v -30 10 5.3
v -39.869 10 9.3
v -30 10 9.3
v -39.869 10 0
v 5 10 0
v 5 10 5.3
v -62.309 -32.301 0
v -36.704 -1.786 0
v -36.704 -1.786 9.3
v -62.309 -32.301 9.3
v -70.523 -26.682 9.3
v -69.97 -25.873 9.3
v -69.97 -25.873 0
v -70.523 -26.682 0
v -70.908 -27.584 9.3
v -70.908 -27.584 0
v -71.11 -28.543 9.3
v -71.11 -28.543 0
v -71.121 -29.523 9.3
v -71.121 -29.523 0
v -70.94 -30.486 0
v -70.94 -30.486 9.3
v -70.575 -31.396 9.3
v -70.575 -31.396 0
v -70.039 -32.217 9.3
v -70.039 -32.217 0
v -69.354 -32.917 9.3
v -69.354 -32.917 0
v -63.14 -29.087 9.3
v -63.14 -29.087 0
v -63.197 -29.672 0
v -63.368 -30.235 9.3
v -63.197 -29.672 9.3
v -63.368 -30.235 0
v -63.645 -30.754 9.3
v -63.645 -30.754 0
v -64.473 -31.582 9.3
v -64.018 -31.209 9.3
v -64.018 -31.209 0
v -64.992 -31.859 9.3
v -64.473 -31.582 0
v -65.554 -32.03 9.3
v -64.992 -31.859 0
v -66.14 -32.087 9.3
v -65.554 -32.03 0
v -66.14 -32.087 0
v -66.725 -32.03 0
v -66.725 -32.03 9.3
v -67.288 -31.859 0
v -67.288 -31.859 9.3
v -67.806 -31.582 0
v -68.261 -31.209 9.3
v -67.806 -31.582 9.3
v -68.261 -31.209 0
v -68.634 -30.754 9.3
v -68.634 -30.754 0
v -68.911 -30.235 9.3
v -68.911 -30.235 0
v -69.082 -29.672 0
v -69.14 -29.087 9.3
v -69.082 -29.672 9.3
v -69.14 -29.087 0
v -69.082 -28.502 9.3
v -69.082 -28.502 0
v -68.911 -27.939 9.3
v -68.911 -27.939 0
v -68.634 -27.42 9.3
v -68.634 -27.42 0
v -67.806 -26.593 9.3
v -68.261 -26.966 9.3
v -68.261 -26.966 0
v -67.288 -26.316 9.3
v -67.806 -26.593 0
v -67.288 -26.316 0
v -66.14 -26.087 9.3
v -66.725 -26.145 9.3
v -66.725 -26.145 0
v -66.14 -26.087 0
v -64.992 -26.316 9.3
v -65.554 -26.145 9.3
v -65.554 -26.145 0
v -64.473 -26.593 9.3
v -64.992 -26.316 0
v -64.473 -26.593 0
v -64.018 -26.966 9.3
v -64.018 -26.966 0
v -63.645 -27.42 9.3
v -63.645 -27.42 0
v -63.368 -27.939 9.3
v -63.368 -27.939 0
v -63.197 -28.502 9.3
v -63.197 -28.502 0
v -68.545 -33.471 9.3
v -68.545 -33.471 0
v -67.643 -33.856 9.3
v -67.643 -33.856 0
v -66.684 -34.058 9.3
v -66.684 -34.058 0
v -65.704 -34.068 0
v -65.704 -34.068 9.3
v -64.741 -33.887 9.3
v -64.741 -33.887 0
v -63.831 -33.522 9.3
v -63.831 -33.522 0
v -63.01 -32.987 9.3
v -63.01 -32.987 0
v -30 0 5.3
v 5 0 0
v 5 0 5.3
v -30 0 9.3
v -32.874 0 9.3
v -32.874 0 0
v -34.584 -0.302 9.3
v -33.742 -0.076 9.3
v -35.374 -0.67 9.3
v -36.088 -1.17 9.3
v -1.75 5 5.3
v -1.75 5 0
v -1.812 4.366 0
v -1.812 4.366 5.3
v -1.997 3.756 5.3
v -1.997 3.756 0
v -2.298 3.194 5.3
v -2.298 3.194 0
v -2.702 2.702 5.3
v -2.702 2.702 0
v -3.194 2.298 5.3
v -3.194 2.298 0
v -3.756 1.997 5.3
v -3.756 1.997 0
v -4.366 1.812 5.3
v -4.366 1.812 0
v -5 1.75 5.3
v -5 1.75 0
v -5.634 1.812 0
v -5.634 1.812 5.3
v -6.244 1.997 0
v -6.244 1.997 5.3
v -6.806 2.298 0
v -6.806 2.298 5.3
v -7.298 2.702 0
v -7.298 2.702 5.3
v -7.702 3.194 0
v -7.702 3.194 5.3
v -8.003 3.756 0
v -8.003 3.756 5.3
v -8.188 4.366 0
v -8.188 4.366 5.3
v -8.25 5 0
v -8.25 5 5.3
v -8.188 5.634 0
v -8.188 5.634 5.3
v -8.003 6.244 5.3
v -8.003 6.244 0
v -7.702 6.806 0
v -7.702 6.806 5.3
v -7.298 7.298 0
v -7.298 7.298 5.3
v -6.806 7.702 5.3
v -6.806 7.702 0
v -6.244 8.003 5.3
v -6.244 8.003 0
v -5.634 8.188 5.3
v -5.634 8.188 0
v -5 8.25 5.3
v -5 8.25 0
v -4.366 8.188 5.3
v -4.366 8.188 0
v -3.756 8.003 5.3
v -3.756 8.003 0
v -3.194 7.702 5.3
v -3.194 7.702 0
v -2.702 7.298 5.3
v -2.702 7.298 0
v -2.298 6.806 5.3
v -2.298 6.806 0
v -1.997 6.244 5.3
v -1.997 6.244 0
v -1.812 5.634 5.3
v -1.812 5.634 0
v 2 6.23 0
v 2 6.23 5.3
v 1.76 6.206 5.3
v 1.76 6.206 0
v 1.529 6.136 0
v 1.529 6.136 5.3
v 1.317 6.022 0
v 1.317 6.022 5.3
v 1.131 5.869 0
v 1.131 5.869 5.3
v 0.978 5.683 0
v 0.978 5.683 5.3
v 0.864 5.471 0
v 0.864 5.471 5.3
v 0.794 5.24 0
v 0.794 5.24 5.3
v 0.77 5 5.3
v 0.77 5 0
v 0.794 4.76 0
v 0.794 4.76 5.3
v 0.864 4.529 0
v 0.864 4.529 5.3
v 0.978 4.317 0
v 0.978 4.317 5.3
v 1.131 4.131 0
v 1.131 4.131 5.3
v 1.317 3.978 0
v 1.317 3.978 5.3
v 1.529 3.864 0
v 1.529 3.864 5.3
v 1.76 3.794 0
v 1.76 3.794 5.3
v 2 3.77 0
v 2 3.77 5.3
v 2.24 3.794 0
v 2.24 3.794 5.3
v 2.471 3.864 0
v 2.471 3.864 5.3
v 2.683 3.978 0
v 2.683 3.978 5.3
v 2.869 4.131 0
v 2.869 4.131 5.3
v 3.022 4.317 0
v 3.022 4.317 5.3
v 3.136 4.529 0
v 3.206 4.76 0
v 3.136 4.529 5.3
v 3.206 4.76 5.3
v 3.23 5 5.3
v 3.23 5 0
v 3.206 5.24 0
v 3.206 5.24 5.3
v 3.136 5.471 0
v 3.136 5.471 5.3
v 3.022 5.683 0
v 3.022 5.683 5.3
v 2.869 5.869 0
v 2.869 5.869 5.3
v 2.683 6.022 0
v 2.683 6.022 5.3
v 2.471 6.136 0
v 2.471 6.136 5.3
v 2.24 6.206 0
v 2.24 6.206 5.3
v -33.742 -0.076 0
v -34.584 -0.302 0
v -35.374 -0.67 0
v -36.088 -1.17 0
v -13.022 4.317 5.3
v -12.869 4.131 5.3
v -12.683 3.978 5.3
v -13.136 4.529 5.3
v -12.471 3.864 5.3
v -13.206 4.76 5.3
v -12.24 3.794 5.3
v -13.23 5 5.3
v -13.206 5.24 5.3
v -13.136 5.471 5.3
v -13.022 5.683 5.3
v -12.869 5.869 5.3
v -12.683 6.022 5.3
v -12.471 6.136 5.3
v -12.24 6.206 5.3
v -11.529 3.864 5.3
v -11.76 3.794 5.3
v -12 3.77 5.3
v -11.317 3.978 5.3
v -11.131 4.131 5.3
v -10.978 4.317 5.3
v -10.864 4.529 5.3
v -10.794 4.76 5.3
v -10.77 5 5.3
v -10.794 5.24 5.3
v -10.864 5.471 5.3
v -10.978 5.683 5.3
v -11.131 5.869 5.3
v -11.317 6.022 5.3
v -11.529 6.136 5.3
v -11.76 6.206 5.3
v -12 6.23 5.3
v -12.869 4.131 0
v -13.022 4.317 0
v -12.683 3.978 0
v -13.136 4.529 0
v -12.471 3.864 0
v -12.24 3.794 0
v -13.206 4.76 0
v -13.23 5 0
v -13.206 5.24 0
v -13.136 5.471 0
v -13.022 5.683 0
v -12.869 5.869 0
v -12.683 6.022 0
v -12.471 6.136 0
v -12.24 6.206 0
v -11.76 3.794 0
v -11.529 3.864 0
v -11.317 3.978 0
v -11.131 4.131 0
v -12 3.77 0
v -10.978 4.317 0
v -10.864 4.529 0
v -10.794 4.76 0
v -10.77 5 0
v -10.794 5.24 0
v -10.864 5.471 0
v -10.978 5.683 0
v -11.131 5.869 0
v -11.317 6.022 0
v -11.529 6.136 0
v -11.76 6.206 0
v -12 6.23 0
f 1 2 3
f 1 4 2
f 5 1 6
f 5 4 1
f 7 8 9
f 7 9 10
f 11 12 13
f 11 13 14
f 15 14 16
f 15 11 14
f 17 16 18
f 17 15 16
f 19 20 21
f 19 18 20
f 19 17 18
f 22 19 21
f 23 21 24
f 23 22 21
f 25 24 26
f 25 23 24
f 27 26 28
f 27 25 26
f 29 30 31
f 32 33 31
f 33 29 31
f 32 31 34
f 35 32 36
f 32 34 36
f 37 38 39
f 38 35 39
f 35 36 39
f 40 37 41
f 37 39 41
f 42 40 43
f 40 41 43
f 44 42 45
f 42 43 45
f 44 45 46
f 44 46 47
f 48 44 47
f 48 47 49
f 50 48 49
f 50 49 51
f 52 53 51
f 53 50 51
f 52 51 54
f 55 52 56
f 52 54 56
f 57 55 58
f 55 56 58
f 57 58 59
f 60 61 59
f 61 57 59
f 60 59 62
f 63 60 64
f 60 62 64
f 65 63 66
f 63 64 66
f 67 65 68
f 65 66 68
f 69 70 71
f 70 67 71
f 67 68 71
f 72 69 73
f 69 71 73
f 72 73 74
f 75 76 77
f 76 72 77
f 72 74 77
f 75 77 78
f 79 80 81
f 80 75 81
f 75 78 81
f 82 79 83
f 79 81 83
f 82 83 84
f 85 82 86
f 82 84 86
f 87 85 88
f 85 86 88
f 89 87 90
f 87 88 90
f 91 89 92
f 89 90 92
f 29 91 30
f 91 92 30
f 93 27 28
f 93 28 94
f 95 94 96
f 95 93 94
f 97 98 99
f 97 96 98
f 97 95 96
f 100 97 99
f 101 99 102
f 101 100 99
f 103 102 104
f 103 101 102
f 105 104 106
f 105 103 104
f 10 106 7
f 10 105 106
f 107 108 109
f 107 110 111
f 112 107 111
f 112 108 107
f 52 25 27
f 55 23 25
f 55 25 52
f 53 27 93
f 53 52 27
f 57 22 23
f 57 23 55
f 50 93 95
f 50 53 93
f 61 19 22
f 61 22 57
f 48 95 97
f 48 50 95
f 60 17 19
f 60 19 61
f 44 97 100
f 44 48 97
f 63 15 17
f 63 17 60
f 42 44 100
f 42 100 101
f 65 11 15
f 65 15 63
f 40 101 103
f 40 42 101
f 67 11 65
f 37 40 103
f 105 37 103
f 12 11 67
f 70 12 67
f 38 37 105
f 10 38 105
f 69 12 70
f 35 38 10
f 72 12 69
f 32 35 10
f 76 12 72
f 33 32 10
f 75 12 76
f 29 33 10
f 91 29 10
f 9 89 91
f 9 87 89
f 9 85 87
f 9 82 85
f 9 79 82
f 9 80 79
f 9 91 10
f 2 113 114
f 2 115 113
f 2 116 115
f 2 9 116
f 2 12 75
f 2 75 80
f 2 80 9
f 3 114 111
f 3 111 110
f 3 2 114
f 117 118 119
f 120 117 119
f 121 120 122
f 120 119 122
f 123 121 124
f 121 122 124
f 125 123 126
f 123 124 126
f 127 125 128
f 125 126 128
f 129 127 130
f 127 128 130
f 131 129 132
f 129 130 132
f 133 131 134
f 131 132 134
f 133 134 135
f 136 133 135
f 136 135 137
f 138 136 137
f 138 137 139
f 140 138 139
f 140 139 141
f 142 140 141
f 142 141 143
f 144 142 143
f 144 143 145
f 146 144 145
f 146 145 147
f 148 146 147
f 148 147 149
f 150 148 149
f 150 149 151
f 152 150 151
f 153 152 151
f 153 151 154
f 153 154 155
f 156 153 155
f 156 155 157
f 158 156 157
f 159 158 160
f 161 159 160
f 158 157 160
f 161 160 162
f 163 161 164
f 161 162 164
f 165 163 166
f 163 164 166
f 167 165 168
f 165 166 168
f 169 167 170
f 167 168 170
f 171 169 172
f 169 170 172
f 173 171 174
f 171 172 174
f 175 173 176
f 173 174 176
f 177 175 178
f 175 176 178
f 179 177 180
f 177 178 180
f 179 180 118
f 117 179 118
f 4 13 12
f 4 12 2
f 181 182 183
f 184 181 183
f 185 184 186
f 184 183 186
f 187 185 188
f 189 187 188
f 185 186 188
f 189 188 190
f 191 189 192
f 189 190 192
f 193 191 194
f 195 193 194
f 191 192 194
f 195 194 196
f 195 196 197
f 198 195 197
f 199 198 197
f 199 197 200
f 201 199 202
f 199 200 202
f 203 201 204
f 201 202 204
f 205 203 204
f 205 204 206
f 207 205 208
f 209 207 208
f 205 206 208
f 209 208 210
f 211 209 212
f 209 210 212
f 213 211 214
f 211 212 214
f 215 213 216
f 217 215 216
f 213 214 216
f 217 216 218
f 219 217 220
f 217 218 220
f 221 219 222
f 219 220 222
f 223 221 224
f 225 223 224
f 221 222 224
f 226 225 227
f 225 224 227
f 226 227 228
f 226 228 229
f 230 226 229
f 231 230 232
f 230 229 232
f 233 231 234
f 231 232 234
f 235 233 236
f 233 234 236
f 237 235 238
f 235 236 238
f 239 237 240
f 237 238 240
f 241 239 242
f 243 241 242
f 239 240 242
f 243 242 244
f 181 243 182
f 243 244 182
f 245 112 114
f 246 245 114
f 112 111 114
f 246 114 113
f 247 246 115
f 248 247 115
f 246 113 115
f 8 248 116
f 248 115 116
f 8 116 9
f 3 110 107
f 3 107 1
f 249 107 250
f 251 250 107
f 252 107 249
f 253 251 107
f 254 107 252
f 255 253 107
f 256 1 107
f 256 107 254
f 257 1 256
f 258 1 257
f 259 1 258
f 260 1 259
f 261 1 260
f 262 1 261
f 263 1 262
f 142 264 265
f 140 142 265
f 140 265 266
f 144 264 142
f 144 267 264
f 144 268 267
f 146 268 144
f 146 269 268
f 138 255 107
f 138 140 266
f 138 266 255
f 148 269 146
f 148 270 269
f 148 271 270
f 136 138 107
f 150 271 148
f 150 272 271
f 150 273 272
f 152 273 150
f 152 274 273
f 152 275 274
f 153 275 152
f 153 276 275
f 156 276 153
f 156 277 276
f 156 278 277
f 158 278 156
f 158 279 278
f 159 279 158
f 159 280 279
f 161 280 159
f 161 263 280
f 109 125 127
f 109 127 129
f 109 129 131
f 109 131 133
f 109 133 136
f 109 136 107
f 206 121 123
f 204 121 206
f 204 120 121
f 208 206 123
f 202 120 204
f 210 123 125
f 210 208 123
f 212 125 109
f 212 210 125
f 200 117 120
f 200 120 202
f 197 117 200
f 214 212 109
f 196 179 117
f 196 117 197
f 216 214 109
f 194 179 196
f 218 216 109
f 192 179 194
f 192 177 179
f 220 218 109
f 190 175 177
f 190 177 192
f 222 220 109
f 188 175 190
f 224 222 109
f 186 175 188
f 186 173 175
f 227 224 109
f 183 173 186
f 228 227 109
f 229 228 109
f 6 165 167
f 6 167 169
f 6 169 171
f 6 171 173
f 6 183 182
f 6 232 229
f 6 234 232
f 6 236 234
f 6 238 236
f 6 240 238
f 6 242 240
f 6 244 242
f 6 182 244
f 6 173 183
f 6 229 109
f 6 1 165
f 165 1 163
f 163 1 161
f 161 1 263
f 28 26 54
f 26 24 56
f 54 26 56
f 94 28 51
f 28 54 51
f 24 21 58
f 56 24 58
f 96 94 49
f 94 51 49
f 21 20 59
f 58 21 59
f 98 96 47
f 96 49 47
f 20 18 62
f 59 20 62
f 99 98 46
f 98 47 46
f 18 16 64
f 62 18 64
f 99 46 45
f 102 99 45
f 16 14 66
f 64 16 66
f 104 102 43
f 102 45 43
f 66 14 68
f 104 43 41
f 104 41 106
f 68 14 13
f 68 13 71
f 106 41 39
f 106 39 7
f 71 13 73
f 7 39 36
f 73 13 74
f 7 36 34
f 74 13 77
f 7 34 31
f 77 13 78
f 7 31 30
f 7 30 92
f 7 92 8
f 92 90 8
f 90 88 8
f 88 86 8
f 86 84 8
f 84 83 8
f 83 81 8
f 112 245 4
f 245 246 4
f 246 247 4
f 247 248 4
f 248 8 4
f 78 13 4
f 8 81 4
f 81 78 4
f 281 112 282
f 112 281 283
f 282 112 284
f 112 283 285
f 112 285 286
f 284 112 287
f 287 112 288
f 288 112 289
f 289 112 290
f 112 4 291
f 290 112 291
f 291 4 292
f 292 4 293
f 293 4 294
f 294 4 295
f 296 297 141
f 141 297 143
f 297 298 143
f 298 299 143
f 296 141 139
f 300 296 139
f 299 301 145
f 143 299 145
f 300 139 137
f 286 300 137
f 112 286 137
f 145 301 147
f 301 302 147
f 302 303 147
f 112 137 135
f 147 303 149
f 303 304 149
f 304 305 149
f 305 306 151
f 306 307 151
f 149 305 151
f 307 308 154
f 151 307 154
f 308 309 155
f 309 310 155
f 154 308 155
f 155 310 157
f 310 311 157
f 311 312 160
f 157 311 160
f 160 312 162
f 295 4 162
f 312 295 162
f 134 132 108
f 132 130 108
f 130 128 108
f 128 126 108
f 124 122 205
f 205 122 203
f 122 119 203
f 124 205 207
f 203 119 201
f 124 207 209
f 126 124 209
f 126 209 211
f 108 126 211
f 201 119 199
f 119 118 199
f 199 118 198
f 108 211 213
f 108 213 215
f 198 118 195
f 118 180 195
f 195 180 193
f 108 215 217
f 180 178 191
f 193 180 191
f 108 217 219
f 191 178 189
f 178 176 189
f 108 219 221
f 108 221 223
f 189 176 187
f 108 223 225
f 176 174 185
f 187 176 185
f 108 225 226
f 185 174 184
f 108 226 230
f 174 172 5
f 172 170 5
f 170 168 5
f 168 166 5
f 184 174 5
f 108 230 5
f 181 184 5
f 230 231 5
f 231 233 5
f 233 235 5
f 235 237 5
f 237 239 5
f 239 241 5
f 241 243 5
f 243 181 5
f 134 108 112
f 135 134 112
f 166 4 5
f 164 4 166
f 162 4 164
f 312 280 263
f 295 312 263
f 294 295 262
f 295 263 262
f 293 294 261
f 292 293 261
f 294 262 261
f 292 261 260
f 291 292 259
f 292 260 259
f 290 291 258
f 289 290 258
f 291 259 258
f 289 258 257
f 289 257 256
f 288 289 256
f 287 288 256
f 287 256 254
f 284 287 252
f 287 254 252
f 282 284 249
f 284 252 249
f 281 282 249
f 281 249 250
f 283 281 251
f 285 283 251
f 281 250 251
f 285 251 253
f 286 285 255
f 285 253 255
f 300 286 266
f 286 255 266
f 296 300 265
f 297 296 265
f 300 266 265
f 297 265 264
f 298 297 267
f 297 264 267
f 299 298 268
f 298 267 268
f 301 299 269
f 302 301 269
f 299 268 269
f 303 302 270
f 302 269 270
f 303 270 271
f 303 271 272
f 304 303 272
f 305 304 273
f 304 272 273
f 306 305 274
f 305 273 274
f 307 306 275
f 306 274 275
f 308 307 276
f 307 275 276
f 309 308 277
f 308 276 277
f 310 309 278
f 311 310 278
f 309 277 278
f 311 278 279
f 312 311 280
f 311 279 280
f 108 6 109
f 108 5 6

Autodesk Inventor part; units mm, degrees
ref_plane "YZ Plane" through (0, 0, 0) normal (1, 0, 0) x (0, 1, 0)
ref_plane "XZ Plane" through (0, 0, 0) normal (0, 1, 0) x (-1, 0, 0)
ref_plane "XY Plane" through (0, 0, 0) normal (0, 0, 1) x (1, 0, 0)
sketch "Sketch1" plane through (0, 0, 0) normal (0, 0, 1) x (1, 0, 0)
  line L0 (0, 0) -> (-35.2056, 0)
  line L1 (-35.2056, 0) -> (-65.5234, -36.1314)
  line L2 (-65.5234, -36.1314) -> (-73.1839, -29.7035)
  line L3 (-73.1839, -29.7035) -> (-39.8687, 10)
  line L4 (-39.8687, 10) -> (0, 10)
  line L5 (0, 10) -> (0, 0)
  circle A0 centre (-66.1397, -29.0872) radius 3
  circle A1 centre (-5, 5) radius 3.25
  line L6 (0, 5) -> (-37.5371, 5) construction
  line L7 (-37.5371, 5) -> (-69.3536, -32.9174) construction
  line L8 (0, 0) -> (-65.5234, -36.1314) construction
  line L9 (0, 10) -> (5, 10)
  line L10 (5, 10) -> (5, 0)
  line L11 (5, 0) -> (0, 0)
  line L12 (0, 0) -> (0, 10)
  dimension "d0" = 10
  dimension "d1" = 6
  dimension "d2" = 6.5
  dimension "d3" = 5
  dimension "d4" = 5
  dimension "d5" = 70
  dimension "d26" = 50
  dimension "d28" = 17
  dimension "d37" = 5
extrude "Extrusion1" add sketch "Sketch1" along normal blind 9.3
fillet "Fillet1" radius 5 3 edges at (-73.1839, -29.7035, 4.65) (-65.5234, -36.1314, 4.65) (-35.2056, 0, 4.65)
sketch "Sketch5" plane through (0, 0, 0) normal (0, 0, -1) x (-1, 0, 0)
  circle A0 centre (5, 5) radius 3.25 projected
  point P0 (0, 0)
  point P1 (12, 5)
  point P2 (-2, 5)
  dimension "d29" = 7
  dimension "d38" = 7
hole "Hole1" at (-12, 5, 0) at (2, 5, 0) direction (0, 0, 1) diameter 2.459 end through all thread size "M3x0.5" class "6H" standard "ISO Metric profile"
sketch "Sketch4" plane through (0, 0, 9.3) normal (0, 0, 1) x (1, 0, 0)
  line L0 (0, 0) -> (-30, 0)
  line L1 (-30, 0) -> (-30, 10)
  line L2 (-30, 10) -> (0, 10)
  line L3 (0, 10) -> (0, 0)
  line L4 (0, 10) -> (5, 10)
  line L5 (5, 10) -> (5, 0)
  line L6 (5, 0) -> (0, 0)
  line L7 (0, 0) -> (0, 10)
  dimension "d20" = 30
extrude "Extrusion4" cut sketch "Sketch4" against normal blind 4
sketch "Sketch6" plane through (0, 0, 9.3) normal (0, 0, 1) x (1, 0, 0)
  line L0 (-3.6029, 27.6633) -> (-80.9851, -10.0258)
  line L1 (-80.9851, -10.0258) -> (-68.4455, -35.7718)
  line L2 (-68.4455, -35.7718) -> (8.9367, 1.9174)
  line L3 (8.9367, 1.9174) -> (-3.6029, 27.6633)
  arc A0 (-69.9699, -25.8733) -> (-62.3095, -32.3011) centre (-66.1397, -29.0872) ccw projected
  line L4 (-83.6105, -9.1202) -> (-2.6973, 30.2887)
  line L5 (-2.6973, 30.2887) -> (11.5621, 1.0117)
  line L6 (11.5621, 1.0117) -> (-69.3511, -38.3971)
  line L7 (-69.3511, -38.3971) -> (-83.6105, -9.1202)
  point P0 (0, 0)
  point P1 (5, 10)
  point P2 (-39.8687, 10)
  point P3 (5, 0)
  dimension "d39" = 90
  dimension "d40" = 32.5648
  dimension "d41" = 1.9638
equation "\"d3\" = 0.5 * d0"
equation "\"d4\" = 0.5 * d0"
equation "\"d38\" = d29"
properties part number "Servo_Strut_v2" material "Steel, Carbon"
